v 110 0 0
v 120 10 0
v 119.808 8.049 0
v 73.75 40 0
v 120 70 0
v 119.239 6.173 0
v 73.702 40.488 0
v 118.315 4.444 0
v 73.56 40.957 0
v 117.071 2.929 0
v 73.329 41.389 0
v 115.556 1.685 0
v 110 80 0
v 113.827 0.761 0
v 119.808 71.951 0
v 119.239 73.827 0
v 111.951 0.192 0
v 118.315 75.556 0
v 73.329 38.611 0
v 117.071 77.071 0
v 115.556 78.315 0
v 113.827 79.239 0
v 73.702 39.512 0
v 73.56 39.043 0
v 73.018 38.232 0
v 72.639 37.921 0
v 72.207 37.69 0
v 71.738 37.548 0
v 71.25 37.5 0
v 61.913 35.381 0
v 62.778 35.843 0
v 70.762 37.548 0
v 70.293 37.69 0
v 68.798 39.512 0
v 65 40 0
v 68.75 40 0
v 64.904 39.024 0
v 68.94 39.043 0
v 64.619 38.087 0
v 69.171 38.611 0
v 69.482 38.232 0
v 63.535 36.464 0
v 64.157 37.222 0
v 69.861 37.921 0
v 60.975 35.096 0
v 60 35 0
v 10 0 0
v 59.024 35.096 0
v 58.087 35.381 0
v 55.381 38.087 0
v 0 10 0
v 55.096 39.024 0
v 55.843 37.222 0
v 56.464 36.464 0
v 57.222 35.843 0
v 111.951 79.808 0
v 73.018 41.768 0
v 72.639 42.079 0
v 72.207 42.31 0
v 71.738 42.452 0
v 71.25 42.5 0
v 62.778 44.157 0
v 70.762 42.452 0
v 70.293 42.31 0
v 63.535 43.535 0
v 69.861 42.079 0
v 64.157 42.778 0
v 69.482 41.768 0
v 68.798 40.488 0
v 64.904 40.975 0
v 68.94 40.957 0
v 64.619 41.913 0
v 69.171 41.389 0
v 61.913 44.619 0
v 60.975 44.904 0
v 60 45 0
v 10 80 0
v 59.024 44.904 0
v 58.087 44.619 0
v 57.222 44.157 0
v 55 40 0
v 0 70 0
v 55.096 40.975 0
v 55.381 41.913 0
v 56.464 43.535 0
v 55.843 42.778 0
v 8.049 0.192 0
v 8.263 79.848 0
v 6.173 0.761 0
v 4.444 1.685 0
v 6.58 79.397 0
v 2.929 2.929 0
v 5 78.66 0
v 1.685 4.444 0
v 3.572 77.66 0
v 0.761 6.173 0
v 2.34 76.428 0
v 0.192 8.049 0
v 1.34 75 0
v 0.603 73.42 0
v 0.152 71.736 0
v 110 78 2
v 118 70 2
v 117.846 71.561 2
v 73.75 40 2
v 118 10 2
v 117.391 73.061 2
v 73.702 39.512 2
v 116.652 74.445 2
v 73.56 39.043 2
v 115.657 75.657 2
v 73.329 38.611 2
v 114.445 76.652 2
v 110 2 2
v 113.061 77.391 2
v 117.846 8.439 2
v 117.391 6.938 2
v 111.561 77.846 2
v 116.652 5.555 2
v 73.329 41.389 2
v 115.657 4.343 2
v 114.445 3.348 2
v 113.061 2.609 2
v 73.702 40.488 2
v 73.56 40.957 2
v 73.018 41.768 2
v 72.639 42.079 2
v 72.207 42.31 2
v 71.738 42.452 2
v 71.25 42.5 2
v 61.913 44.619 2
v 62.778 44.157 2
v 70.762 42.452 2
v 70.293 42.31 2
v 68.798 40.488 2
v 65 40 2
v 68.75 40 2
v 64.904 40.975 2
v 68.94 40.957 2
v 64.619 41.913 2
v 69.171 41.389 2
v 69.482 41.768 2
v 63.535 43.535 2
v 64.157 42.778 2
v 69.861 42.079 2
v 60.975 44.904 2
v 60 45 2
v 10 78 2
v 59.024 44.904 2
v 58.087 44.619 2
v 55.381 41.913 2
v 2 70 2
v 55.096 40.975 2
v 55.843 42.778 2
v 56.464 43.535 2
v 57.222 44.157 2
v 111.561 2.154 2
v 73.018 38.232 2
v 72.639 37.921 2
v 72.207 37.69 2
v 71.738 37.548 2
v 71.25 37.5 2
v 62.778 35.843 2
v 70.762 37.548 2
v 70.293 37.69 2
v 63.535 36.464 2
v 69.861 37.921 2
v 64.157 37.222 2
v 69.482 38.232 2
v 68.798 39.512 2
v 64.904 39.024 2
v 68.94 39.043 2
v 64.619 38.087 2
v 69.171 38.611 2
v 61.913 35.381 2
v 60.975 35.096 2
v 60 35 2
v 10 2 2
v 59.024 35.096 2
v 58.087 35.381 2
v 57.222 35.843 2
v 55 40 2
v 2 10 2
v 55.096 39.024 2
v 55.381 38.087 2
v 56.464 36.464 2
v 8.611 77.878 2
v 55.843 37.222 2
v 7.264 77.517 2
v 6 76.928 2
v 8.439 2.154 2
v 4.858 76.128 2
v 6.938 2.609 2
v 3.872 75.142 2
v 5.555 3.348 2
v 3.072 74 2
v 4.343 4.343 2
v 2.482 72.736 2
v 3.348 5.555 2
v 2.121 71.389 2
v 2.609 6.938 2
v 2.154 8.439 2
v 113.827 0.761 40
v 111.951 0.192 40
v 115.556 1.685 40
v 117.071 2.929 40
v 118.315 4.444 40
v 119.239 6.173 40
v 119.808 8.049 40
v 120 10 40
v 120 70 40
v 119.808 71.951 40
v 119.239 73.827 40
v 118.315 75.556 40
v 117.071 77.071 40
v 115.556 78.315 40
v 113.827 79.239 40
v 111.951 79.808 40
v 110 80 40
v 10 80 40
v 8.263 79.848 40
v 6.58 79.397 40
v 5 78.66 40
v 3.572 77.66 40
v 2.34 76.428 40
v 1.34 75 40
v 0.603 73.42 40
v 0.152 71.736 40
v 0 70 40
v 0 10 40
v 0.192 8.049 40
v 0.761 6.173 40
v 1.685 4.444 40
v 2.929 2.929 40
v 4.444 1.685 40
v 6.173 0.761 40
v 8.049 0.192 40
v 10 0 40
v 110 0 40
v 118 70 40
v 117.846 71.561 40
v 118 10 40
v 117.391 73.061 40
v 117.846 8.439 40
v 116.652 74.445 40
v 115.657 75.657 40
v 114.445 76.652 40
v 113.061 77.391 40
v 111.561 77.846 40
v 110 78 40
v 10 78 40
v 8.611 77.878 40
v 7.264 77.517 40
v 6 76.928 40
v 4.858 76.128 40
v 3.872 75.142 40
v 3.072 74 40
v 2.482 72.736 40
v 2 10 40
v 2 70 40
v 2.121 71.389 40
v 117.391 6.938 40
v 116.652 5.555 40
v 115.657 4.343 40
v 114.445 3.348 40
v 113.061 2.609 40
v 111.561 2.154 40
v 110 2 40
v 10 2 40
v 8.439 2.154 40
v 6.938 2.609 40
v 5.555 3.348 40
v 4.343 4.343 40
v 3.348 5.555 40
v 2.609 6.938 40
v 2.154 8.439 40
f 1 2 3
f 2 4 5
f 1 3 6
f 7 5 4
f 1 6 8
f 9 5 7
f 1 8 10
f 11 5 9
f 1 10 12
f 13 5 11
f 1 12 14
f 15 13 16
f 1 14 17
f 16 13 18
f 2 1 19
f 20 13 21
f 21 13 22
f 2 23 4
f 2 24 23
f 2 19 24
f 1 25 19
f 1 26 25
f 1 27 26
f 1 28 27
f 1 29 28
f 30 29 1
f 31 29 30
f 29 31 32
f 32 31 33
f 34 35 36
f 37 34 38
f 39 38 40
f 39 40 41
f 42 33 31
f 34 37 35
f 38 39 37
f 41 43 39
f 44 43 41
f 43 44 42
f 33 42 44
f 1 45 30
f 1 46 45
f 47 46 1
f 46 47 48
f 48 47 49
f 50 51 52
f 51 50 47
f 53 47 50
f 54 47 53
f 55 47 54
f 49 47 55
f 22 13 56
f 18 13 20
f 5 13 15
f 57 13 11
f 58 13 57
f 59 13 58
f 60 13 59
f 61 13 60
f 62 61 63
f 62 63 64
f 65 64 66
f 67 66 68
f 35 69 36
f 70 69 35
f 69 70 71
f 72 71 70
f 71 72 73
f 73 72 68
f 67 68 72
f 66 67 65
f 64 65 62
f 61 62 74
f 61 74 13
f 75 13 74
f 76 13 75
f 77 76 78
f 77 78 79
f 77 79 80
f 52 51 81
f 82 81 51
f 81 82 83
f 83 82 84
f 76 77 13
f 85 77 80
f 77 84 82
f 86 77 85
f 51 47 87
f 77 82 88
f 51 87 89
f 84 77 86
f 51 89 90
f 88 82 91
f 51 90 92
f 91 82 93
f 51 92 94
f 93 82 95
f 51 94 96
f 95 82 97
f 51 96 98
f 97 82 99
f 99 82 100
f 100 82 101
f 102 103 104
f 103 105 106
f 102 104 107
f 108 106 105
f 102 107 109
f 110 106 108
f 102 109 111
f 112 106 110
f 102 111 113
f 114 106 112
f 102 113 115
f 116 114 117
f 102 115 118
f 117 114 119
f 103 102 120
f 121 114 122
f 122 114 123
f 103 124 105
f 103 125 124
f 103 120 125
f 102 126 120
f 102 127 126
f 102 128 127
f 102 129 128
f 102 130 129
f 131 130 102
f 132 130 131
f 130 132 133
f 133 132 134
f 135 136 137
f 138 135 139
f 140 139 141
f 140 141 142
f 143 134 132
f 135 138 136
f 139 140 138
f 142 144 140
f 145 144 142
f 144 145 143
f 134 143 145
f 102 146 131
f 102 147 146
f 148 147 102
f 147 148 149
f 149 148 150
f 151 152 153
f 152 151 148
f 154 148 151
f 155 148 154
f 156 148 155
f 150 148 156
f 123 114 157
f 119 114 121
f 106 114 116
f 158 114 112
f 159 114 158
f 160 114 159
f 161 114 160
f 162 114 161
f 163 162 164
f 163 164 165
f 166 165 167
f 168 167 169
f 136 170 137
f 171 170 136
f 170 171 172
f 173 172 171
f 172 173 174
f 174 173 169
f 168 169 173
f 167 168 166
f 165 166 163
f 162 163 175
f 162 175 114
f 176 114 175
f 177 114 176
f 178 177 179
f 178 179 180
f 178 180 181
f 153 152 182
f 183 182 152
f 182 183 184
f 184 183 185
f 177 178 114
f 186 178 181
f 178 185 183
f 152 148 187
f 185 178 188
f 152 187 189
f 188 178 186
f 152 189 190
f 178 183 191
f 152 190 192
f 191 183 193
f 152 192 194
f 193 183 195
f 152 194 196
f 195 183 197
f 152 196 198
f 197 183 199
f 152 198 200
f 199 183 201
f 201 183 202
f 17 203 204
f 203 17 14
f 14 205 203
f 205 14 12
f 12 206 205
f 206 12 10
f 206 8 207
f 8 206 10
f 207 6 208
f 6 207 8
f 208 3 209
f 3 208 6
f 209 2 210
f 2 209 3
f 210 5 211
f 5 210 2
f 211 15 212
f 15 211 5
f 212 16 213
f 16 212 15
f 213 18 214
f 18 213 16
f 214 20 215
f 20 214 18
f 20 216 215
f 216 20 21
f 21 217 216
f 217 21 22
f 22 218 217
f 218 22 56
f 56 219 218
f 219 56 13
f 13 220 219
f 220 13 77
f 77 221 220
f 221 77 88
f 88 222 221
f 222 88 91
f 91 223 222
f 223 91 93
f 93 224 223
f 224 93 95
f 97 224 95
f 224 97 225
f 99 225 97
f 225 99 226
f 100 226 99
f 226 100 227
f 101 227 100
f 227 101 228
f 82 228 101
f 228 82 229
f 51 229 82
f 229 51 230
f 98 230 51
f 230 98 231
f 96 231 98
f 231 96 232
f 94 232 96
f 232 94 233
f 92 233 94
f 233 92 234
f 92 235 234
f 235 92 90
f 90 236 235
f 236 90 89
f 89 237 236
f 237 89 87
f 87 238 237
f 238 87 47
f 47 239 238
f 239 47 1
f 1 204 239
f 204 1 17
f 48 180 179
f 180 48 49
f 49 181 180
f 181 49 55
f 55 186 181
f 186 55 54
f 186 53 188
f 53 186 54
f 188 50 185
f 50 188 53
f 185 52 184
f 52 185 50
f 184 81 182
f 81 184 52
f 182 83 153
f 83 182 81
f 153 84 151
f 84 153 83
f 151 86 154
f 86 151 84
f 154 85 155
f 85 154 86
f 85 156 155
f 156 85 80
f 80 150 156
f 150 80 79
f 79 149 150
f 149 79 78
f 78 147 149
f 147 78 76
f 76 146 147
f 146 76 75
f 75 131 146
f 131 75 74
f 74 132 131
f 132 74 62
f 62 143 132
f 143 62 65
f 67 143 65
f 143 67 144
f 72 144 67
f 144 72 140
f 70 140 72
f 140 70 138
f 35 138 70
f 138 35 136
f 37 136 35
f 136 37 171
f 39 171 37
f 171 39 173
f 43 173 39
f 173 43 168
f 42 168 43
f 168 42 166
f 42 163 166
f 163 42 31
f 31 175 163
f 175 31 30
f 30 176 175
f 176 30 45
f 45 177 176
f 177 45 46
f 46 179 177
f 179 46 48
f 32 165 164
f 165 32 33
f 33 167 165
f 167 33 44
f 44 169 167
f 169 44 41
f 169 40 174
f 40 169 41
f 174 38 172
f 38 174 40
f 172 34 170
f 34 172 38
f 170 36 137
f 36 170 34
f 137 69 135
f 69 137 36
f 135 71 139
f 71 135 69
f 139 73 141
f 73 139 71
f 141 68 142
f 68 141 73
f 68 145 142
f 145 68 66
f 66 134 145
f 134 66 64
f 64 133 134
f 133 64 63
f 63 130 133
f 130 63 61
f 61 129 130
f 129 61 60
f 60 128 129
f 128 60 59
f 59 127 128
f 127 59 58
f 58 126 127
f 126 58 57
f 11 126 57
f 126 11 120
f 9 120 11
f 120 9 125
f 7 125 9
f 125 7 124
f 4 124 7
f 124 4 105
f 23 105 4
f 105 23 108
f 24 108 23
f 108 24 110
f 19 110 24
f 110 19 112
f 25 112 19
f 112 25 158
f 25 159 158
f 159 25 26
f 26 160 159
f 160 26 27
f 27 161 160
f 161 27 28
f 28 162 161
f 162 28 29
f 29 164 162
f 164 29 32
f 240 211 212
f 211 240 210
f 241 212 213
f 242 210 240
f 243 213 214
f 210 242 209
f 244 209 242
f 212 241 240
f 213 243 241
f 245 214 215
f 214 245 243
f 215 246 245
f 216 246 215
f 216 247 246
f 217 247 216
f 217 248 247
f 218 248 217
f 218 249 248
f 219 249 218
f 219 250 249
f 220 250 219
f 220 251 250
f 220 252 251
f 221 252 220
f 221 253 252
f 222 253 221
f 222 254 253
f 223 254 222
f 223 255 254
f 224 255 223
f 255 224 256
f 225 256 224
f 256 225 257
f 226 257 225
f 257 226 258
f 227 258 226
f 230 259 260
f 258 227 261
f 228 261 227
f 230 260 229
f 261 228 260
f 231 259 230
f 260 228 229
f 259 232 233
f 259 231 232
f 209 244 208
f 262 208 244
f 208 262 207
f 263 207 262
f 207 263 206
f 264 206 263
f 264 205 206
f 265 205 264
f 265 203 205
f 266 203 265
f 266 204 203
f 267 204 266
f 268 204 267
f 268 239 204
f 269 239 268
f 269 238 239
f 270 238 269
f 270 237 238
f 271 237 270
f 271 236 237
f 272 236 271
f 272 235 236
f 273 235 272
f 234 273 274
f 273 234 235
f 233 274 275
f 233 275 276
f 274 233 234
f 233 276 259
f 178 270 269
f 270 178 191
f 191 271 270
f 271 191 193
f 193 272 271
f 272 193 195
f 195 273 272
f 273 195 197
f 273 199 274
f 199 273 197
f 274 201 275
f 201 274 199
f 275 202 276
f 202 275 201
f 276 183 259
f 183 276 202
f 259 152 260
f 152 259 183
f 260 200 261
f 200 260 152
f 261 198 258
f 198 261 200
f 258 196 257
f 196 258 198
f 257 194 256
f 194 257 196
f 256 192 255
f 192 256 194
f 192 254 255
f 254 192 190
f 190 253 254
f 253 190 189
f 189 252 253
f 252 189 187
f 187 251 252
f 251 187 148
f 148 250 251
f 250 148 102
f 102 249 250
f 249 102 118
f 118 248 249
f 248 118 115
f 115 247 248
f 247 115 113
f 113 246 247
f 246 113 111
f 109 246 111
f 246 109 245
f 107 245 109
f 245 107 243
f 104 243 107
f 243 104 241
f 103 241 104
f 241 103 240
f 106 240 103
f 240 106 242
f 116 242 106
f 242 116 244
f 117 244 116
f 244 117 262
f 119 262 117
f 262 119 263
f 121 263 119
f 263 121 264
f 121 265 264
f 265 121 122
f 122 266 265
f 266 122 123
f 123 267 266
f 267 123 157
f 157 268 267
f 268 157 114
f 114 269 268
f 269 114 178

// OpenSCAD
// Generated by Parametrix
ca_myBox_faceBottom_000 = [ [ 10.0000, 0.0000 ],[ 110.0000, 0.0000 ],[ 111.9509, 0.1921 ],[ 113.8268, 0.7612 ],[ 115.5557, 1.6853 ],[ 117.0711, 2.9289 ],[ 118.3147, 4.4443 ],[ 119.2388, 6.1732 ],[ 119.8079, 8.0491 ],[ 120.0000, 10.0000 ],[ 120.0000, 70.0000 ],[ 119.8079, 71.9509 ],[ 119.2388, 73.8268 ],[ 118.3147, 75.5557 ],[ 117.0711, 77.0711 ],[ 115.5557, 78.3147 ],[ 113.8268, 79.2388 ],[ 111.9509, 79.8079 ],[ 110.0000, 80.0000 ],[ 10.0000, 80.0000 ],[ 8.2635, 79.8481 ],[ 6.5798, 79.3969 ],[ 5.0000, 78.6603 ],[ 3.5721, 77.6604 ],[ 2.3396, 76.4279 ],[ 1.3397, 75.0000 ],[ 0.6031, 73.4202 ],[ 0.1519, 71.7365 ],[ 0.0000, 70.0000 ],[ 0.0000, 10.0000 ],[ 0.1921, 8.0491 ],[ 0.7612, 6.1732 ],[ 1.6853, 4.4443 ],[ 2.9289, 2.9289 ],[ 4.4443, 1.6853 ],[ 6.1732, 0.7612 ],[ 8.0491, 0.1921 ],[ 10.0000, 0.0000 ] ];
cb_myBox_faceBottom_000 = [  0, 1, 2, 3, 4, 5, 6, 7, 8, 9, 10, 11, 12, 13, 14, 15, 16, 17, 18, 19, 20, 21, 22, 23, 24, 25, 26, 27, 28, 29, 30, 31, 32, 33, 34, 35, 36, 37 ];
ca_myBox_faceBottom_001 = [ [ 65.0000, 40.0000 ],[ 64.9039, 40.9755 ],[ 64.6194, 41.9134 ],[ 64.1573, 42.7779 ],[ 63.5355, 43.5355 ],[ 62.7779, 44.1573 ],[ 61.9134, 44.6194 ],[ 60.9755, 44.9039 ],[ 60.0000, 45.0000 ],[ 59.0245, 44.9039 ],[ 58.0866, 44.6194 ],[ 57.2221, 44.1573 ],[ 56.4645, 43.5355 ],[ 55.8427, 42.7779 ],[ 55.3806, 41.9134 ],[ 55.0961, 40.9755 ],[ 55.0000, 40.0000 ],[ 55.0961, 39.0245 ],[ 55.3806, 38.0866 ],[ 55.8427, 37.2221 ],[ 56.4645, 36.4645 ],[ 57.2221, 35.8427 ],[ 58.0866, 35.3806 ],[ 59.0245, 35.0961 ],[ 60.0000, 35.0000 ],[ 60.9755, 35.0961 ],[ 61.9134, 35.3806 ],[ 62.7779, 35.8427 ],[ 63.5355, 36.4645 ],[ 64.1573, 37.2221 ],[ 64.6194, 38.0866 ],[ 64.9039, 39.0245 ],[ 65.0000, 40.0000 ] ];
cb_myBox_faceBottom_001 = [  38, 39, 40, 41, 42, 43, 44, 45, 46, 47, 48, 49, 50, 51, 52, 53, 54, 55, 56, 57, 58, 59, 60, 61, 62, 63, 64, 65, 66, 67, 68, 69, 70 ];
ca_myBox_faceBottom_002 = [ [ 73.7500, 40.0000 ],[ 73.7020, 40.4877 ],[ 73.5597, 40.9567 ],[ 73.3287, 41.3889 ],[ 73.0178, 41.7678 ],[ 72.6389, 42.0787 ],[ 72.2067, 42.3097 ],[ 71.7377, 42.4520 ],[ 71.2500, 42.5000 ],[ 70.7623, 42.4520 ],[ 70.2933, 42.3097 ],[ 69.8611, 42.0787 ],[ 69.4822, 41.7678 ],[ 69.1713, 41.3889 ],[ 68.9403, 40.9567 ],[ 68.7980, 40.4877 ],[ 68.7500, 40.0000 ],[ 68.7980, 39.5123 ],[ 68.9403, 39.0433 ],[ 69.1713, 38.6111 ],[ 69.4822, 38.2322 ],[ 69.8611, 37.9213 ],[ 70.2933, 37.6903 ],[ 70.7623, 37.5480 ],[ 71.2500, 37.5000 ],[ 71.7377, 37.5480 ],[ 72.2067, 37.6903 ],[ 72.6389, 37.9213 ],[ 73.0178, 38.2322 ],[ 73.3287, 38.6111 ],[ 73.5597, 39.0433 ],[ 73.7020, 39.5123 ],[ 73.7500, 40.0000 ] ];
cb_myBox_faceBottom_002 = [  71, 72, 73, 74, 75, 76, 77, 78, 79, 80, 81, 82, 83, 84, 85, 86, 87, 88, 89, 90, 91, 92, 93, 94, 95, 96, 97, 98, 99, 100, 101, 102, 103 ];
a_myBox_faceBottom = concat(ca_myBox_faceBottom_000, ca_myBox_faceBottom_001, ca_myBox_faceBottom_002);
b_myBox_faceBottom = [cb_myBox_faceBottom_000, cb_myBox_faceBottom_001, cb_myBox_faceBottom_002];
ca_myBox_faceTop_000 = [ [ 10.0000, 0.0000 ],[ 110.0000, 0.0000 ],[ 111.9509, 0.1921 ],[ 113.8268, 0.7612 ],[ 115.5557, 1.6853 ],[ 117.0711, 2.9289 ],[ 118.3147, 4.4443 ],[ 119.2388, 6.1732 ],[ 119.8079, 8.0491 ],[ 120.0000, 10.0000 ],[ 120.0000, 70.0000 ],[ 119.8079, 71.9509 ],[ 119.2388, 73.8268 ],[ 118.3147, 75.5557 ],[ 117.0711, 77.0711 ],[ 115.5557, 78.3147 ],[ 113.8268, 79.2388 ],[ 111.9509, 79.8079 ],[ 110.0000, 80.0000 ],[ 10.0000, 80.0000 ],[ 8.2635, 79.8481 ],[ 6.5798, 79.3969 ],[ 5.0000, 78.6603 ],[ 3.5721, 77.6604 ],[ 2.3396, 76.4279 ],[ 1.3397, 75.0000 ],[ 0.6031, 73.4202 ],[ 0.1519, 71.7365 ],[ 0.0000, 70.0000 ],[ 0.0000, 10.0000 ],[ 0.1921, 8.0491 ],[ 0.7612, 6.1732 ],[ 1.6853, 4.4443 ],[ 2.9289, 2.9289 ],[ 4.4443, 1.6853 ],[ 6.1732, 0.7612 ],[ 8.0491, 0.1921 ],[ 10.0000, 0.0000 ] ];
cb_myBox_faceTop_000 = [  0, 1, 2, 3, 4, 5, 6, 7, 8, 9, 10, 11, 12, 13, 14, 15, 16, 17, 18, 19, 20, 21, 22, 23, 24, 25, 26, 27, 28, 29, 30, 31, 32, 33, 34, 35, 36, 37 ];
ca_myBox_faceTop_001 = [ [ 10.0000, 2.0000 ],[ 110.0000, 2.0000 ],[ 111.5607, 2.1537 ],[ 113.0615, 2.6090 ],[ 114.4446, 3.3482 ],[ 115.6569, 4.3431 ],[ 116.6518, 5.5554 ],[ 117.3910, 6.9385 ],[ 117.8463, 8.4393 ],[ 118.0000, 10.0000 ],[ 118.0000, 70.0000 ],[ 117.8463, 71.5607 ],[ 117.3910, 73.0615 ],[ 116.6518, 74.4446 ],[ 115.6569, 75.6569 ],[ 114.4446, 76.6518 ],[ 113.0615, 77.3910 ],[ 111.5607, 77.8463 ],[ 110.0000, 78.0000 ],[ 10.0000, 78.0000 ],[ 8.6108, 77.8785 ],[ 7.2638, 77.5175 ],[ 6.0000, 76.9282 ],[ 4.8577, 76.1284 ],[ 3.8716, 75.1423 ],[ 3.0718, 74.0000 ],[ 2.4825, 72.7362 ],[ 2.1215, 71.3892 ],[ 2.0000, 70.0000 ],[ 2.0000, 10.0000 ],[ 2.1537, 8.4393 ],[ 2.6090, 6.9385 ],[ 3.3482, 5.5554 ],[ 4.3431, 4.3431 ],[ 5.5554, 3.3482 ],[ 6.9385, 2.6090 ],[ 8.4393, 2.1537 ],[ 10.0000, 2.0000 ] ];
cb_myBox_faceTop_001 = [  38, 39, 40, 41, 42, 43, 44, 45, 46, 47, 48, 49, 50, 51, 52, 53, 54, 55, 56, 57, 58, 59, 60, 61, 62, 63, 64, 65, 66, 67, 68, 69, 70, 71, 72, 73, 74, 75 ];
a_myBox_faceTop = concat(ca_myBox_faceTop_000, ca_myBox_faceTop_001);
b_myBox_faceTop = [cb_myBox_faceTop_000, cb_myBox_faceTop_001];
ca_myBox_faceSide_000 = [ [ 0.0000, 0.0000 ],[ 80.0000, 0.0000 ],[ 80.0000, 40.0000 ],[ 78.0000, 40.0000 ],[ 78.0000, 2.0000 ],[ 2.0000, 2.0000 ],[ 2.0000, 40.0000 ],[ 0.0000, 40.0000 ],[ 0.0000, 0.0000 ] ];
cb_myBox_faceSide_000 = [  0, 1, 2, 3, 4, 5, 6, 7, 8 ];
a_myBox_faceSide = concat(ca_myBox_faceSide_000);
b_myBox_faceSide = [cb_myBox_faceSide_000];
ca_myBox_faceFace_000 = [ [ 0.0000, 0.0000 ],[ 120.0000, 0.0000 ],[ 120.0000, 40.0000 ],[ 118.0000, 40.0000 ],[ 118.0000, 2.0000 ],[ 2.0000, 2.0000 ],[ 2.0000, 40.0000 ],[ 0.0000, 40.0000 ],[ 0.0000, 0.0000 ] ];
cb_myBox_faceFace_000 = [  0, 1, 2, 3, 4, 5, 6, 7, 8 ];
a_myBox_faceFace = concat(ca_myBox_faceFace_000);
b_myBox_faceFace = [cb_myBox_faceFace_000];

module subpax_myBox_bottom () {
	translate( [ 0, 0, 0 ])
		rotate( [ 0, 0, 0 ])
			   linear_extrude(height = 2) polygon(a_myBox_faceBottom, b_myBox_faceBottom);
}

module subpax_myBox_top () {
	translate( [ 0, 0, 2 ])
		rotate( [ 0, 0, 0 ])
			   linear_extrude(height = 38) polygon(a_myBox_faceTop, b_myBox_faceTop);
}

module pax_myBox () {
	union () {
		subpax_myBox_bottom();
subpax_myBox_top();
	}
}

pax_myBox();
